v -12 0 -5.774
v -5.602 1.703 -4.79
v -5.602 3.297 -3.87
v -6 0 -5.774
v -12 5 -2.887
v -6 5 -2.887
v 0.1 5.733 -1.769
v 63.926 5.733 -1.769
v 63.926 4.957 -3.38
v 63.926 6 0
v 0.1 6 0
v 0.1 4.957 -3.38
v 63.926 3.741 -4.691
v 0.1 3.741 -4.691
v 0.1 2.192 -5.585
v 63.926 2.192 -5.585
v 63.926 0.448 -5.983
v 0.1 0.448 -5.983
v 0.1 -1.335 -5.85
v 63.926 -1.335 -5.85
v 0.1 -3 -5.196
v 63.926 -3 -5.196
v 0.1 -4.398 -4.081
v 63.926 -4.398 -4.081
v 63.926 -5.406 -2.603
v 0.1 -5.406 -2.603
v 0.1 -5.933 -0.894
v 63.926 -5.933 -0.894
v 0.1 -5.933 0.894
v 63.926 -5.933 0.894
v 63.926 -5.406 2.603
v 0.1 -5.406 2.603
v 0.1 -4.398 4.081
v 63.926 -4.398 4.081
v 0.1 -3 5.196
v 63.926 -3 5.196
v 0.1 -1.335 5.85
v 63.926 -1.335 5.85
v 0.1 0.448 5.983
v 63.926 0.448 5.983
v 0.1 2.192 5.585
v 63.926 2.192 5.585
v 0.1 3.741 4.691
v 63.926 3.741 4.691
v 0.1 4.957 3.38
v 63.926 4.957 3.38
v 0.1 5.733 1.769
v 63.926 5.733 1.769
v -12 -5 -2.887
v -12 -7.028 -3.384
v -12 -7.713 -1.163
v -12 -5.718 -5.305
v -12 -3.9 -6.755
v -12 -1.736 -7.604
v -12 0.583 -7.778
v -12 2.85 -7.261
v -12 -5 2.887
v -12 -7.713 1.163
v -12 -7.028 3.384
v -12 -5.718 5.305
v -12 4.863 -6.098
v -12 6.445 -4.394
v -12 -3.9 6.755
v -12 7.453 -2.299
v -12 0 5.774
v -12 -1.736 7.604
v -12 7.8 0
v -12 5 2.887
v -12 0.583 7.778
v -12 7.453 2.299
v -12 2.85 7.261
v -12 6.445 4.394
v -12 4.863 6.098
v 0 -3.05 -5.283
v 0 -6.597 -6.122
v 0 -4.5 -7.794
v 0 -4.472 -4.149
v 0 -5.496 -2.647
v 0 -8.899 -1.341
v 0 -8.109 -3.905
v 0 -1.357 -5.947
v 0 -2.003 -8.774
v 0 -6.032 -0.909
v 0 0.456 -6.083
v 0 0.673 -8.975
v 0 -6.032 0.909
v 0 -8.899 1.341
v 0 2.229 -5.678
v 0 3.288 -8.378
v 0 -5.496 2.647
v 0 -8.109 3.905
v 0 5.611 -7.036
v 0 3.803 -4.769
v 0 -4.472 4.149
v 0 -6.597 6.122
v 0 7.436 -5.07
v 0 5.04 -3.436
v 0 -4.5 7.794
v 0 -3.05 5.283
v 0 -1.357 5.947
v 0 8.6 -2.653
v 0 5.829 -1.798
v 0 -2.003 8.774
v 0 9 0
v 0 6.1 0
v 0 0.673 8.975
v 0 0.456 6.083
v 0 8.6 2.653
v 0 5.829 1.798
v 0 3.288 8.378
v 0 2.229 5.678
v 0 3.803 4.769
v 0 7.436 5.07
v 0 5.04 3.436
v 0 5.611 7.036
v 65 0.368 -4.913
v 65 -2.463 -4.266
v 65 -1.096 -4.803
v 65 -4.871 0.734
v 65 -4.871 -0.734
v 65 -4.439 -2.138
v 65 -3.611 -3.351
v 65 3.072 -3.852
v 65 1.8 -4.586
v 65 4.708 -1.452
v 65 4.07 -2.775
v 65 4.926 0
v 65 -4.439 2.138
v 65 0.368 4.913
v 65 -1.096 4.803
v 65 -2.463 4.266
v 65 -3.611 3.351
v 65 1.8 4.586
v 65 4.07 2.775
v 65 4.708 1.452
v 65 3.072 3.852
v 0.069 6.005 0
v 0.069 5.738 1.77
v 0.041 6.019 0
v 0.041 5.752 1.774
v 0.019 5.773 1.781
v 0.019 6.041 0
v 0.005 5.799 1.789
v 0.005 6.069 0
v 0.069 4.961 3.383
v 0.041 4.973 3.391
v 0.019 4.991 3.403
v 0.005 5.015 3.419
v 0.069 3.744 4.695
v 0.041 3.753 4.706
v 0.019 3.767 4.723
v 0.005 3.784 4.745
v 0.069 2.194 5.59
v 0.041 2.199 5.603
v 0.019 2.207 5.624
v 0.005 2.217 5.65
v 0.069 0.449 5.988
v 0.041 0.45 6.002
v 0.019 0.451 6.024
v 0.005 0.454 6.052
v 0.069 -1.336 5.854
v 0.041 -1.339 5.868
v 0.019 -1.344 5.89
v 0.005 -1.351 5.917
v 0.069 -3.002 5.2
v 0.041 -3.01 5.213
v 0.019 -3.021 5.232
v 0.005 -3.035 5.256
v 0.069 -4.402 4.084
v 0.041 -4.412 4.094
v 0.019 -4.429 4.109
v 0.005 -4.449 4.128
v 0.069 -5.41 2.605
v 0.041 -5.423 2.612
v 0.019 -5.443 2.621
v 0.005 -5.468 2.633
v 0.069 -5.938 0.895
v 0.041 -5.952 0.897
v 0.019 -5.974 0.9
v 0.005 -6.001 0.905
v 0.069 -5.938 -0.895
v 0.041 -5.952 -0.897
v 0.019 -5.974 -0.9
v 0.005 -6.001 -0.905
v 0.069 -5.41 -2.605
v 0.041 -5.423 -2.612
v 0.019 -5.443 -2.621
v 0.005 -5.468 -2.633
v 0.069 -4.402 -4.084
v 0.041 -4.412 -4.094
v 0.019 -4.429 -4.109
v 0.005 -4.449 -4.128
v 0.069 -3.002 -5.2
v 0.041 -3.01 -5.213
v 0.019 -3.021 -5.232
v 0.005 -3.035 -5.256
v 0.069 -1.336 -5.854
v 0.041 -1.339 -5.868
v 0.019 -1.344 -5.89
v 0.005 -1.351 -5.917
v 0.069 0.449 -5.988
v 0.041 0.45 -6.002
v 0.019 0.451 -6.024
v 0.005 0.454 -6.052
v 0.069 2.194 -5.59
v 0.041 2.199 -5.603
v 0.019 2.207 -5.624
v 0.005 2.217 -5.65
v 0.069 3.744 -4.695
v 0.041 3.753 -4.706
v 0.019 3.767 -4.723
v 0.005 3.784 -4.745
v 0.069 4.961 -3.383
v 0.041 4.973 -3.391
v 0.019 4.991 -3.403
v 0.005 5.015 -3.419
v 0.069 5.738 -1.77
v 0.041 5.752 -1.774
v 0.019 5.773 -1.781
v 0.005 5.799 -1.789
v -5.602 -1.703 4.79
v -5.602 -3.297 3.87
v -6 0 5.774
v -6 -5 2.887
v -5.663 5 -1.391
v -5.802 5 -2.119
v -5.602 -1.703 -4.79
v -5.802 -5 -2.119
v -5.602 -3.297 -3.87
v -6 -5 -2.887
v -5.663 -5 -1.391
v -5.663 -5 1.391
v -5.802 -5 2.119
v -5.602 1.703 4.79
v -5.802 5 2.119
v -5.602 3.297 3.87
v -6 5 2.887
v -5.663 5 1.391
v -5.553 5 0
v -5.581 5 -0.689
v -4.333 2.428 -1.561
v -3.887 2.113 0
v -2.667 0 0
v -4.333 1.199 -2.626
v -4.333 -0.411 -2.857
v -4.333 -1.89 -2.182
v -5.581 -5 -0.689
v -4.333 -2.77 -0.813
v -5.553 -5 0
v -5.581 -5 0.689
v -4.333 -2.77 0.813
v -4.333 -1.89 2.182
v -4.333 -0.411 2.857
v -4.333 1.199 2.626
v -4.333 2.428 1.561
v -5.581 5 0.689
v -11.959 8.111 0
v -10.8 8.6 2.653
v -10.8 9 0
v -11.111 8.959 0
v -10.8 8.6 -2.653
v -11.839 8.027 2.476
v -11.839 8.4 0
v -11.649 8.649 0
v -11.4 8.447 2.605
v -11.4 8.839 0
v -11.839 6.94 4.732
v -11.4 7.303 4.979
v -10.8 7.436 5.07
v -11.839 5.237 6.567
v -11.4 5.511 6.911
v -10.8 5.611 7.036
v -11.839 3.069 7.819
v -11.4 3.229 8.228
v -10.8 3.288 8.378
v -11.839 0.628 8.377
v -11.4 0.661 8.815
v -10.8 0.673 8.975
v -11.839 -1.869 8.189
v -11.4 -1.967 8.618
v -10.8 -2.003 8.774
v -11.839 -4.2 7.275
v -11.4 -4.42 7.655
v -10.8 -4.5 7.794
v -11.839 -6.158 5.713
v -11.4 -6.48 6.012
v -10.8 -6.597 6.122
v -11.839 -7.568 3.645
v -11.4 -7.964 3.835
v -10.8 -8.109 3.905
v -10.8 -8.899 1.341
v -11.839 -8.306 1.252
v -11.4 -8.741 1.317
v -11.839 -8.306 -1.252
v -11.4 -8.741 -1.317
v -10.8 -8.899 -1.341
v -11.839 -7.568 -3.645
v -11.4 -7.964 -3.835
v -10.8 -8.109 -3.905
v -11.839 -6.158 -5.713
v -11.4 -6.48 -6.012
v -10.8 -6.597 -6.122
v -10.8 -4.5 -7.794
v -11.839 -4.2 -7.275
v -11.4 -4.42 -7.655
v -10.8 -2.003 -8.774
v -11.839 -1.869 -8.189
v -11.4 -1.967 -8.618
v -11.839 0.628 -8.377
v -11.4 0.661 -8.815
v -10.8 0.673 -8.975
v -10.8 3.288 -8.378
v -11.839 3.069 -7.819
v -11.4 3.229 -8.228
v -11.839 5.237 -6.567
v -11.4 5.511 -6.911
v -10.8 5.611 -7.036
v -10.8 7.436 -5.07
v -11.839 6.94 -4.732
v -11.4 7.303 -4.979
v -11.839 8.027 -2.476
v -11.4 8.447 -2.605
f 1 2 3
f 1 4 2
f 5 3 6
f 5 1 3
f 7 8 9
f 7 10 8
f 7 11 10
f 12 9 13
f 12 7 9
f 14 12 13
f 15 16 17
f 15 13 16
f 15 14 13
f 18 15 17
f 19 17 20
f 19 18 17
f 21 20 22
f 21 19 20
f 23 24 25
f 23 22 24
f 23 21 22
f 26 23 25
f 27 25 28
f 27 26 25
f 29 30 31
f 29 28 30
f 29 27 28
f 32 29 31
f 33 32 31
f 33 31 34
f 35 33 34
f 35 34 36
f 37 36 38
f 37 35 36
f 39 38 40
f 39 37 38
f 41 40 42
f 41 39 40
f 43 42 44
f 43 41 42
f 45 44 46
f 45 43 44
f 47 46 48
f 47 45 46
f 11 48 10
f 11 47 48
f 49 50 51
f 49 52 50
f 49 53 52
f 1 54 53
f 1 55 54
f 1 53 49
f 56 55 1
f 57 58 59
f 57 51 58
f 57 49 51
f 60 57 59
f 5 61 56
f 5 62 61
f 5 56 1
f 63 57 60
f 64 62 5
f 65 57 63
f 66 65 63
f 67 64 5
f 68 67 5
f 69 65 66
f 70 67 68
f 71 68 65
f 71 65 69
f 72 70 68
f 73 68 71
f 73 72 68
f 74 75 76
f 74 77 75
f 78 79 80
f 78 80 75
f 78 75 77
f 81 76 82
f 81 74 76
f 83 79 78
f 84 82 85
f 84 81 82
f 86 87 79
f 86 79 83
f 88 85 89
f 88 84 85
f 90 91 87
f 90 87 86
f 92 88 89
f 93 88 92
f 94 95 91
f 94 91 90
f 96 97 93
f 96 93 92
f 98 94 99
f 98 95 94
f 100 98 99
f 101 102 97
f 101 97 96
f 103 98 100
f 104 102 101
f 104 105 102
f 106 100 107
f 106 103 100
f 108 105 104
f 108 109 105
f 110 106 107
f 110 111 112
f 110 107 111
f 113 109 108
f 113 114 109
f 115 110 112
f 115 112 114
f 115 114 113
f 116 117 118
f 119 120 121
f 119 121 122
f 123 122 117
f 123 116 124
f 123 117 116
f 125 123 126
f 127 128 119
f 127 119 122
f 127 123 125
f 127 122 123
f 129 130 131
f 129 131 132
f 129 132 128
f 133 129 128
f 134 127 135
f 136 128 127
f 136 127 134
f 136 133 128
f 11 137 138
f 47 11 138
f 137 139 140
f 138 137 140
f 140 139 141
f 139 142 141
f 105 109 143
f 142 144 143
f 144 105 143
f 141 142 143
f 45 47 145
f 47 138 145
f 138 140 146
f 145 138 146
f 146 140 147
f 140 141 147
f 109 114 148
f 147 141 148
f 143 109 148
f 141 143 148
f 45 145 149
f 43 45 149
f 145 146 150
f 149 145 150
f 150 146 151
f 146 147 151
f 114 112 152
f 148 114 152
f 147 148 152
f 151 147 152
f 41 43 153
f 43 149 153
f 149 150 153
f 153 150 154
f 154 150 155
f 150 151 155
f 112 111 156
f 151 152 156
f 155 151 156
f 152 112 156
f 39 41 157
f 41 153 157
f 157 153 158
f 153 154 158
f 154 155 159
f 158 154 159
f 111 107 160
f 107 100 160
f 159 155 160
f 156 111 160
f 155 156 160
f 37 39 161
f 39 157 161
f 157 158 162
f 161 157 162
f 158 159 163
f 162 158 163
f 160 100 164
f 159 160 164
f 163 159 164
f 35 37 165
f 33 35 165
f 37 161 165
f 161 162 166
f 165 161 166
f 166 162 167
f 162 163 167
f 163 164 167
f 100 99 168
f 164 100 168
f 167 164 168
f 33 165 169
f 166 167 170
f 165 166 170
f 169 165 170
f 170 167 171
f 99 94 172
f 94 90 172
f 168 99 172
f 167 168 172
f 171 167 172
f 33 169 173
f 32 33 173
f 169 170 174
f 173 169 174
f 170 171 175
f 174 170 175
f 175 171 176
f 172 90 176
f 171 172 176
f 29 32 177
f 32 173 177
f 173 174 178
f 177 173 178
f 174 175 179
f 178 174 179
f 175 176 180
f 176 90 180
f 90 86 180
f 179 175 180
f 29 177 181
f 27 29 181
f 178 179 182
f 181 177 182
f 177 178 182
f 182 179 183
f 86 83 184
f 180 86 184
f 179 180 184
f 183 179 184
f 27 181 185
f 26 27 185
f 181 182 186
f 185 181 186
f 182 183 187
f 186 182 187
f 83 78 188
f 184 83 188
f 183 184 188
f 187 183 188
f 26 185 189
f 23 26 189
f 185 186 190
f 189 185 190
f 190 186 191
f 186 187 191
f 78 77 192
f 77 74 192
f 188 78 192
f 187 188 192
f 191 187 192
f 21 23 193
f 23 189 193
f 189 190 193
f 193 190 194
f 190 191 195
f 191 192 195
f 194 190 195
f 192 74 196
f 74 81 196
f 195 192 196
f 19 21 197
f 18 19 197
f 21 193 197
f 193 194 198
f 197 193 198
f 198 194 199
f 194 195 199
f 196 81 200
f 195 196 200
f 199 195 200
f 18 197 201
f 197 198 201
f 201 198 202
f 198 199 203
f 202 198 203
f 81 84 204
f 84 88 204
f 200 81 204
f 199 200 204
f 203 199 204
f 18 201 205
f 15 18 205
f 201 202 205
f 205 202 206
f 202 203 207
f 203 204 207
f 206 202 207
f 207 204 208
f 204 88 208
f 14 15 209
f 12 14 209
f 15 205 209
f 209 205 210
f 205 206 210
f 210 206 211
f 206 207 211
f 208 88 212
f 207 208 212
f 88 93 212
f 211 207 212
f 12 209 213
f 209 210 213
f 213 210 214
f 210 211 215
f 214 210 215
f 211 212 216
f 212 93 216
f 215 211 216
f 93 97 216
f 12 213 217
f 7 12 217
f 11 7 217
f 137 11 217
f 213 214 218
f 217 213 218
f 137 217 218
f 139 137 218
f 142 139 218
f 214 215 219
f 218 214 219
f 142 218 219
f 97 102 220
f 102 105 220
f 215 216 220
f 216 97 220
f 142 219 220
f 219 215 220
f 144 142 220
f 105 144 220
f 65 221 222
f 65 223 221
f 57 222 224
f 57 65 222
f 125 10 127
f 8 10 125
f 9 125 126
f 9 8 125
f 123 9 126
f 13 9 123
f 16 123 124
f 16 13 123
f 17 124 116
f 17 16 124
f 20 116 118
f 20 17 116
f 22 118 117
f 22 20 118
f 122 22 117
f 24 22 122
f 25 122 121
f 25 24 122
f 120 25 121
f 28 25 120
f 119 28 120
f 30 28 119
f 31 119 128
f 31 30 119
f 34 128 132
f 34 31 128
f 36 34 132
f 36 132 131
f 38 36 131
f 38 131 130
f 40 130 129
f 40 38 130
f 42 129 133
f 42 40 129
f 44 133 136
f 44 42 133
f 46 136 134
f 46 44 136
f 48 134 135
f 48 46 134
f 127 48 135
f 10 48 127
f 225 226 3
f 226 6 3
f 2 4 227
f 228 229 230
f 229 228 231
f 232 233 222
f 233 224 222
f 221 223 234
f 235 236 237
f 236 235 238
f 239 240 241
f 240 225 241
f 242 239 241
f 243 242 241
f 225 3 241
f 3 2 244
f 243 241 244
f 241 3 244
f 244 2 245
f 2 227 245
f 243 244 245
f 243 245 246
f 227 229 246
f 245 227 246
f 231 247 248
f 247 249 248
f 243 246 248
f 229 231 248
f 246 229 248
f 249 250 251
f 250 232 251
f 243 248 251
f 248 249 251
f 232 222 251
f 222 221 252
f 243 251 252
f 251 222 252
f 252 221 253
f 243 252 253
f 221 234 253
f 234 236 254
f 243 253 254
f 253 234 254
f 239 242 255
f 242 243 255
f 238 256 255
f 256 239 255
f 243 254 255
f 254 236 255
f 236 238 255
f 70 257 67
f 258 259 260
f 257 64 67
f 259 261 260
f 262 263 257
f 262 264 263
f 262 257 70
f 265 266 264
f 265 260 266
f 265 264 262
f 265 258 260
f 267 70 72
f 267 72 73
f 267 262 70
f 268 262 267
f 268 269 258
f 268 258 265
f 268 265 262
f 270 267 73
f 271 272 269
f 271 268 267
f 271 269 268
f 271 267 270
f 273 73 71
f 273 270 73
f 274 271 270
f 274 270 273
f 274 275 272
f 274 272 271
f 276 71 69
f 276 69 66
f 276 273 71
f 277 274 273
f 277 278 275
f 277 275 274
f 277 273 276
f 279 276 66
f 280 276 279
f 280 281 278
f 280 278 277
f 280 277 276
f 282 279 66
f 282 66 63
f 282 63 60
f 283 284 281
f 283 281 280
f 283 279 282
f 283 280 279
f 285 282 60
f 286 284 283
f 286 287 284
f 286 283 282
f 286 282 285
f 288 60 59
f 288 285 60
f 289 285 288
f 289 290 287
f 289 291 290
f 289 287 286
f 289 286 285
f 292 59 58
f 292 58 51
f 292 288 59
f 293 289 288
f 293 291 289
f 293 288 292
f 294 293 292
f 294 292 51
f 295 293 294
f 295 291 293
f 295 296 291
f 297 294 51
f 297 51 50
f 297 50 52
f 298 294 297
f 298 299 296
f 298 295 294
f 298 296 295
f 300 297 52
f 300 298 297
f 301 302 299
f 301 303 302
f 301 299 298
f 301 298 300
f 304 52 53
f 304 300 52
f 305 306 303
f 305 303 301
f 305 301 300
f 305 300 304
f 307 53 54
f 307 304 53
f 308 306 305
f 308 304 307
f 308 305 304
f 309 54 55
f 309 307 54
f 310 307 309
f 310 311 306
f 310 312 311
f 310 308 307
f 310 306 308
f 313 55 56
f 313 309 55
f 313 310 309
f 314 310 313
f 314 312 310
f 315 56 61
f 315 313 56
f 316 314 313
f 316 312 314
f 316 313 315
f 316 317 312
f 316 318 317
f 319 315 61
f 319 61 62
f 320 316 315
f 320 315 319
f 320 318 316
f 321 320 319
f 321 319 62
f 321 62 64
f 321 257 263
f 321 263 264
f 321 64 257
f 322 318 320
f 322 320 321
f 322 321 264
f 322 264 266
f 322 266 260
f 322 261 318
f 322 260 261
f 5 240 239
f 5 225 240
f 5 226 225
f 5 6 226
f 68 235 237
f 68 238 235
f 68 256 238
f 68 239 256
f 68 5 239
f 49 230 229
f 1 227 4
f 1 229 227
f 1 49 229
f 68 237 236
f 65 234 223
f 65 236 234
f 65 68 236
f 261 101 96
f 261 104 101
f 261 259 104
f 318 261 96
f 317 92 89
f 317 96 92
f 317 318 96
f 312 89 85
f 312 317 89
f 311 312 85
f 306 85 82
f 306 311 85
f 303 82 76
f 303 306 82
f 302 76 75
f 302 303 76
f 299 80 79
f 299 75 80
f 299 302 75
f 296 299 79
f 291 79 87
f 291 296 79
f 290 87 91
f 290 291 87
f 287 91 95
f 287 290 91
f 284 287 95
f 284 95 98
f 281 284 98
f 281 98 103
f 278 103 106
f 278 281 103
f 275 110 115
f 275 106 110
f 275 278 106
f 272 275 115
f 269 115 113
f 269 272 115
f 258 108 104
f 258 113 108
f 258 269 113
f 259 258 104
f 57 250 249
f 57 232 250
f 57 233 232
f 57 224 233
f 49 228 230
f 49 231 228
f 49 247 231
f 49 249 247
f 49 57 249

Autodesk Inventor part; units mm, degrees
ref_plane "YZ Plane" through (0, 0, 0) normal (1, 0, 0) x (0, 1, 0)
ref_plane "XZ Plane" through (0, 0, 0) normal (0, 1, 0) x (-1, 0, 0)
sketch "Rascunho1" plane through (0, 0, 0) normal (0, 0, 1) x (1, 0, 0)
  line L0 (-2.6667, 0) -> (65, 0)
  line L1 (65, 0) -> (65, 6)
  line L2 (65, 6) -> (29, 6)
  line L3 (29, 6) -> (27.9264, 6)
  line L4 (27.9264, 6) -> (0, 6)
  line L5 (0, 6) -> (0, 9)
  line L6 (0, 9) -> (-12, 9)
  line L7 (-12, 9) -> (-12, 5.7735)
  line L8 (-12, 5.7735) -> (-6, 5.7735)
  line L9 (-6, 5.7735) -> (-2.6667, 0)
  line L10 (-34.4, 0) -> (122.4, 0) projected
  line L11 (0, -1.8) -> (0, 10.8) projected
  line L12 (29, 6) -> (0, 6) construction
  dimension "d1" = 36
  dimension "d2" = 1.0736
  dimension "d3" = 12
  dimension "d4" = 6
  dimension "d5" = 60
  dimension "d6" = 12
  dimension "d7" = 12
  dimension "d8" = 11.547
  dimension "d9" = 18
  dimension "d26" = 65
revolve "Corpo" add sketch "Rascunho1" angle 360 about axis through (-2.6667, 0, 0) along (1, 0, 0)
sketch "Rascunho2" plane through (-12, 0, 0) normal (-1, 0, 0) x (0, 0, 1)
  circle A0 centre (0, 0) radius 5.7735 projected
  line L0 (0, -12.6) -> (0, 12.6) projected
  line L1 (-12.6, 0) -> (12.6, 0) projected
  line L2 (5.7735, 0) -> (2.8868, -5)
  line L3 (2.8868, -5) -> (-2.8868, -5)
  line L4 (-2.8868, -5) -> (-5.7735, 0)
  line L5 (-5.7735, 0) -> (-2.8868, 5)
  line L6 (-2.8868, 5) -> (2.8868, 5)
  line L7 (2.8868, 5) -> (5.7735, 0)
extrude "Fenda" add sketch "Rascunho2" against normal up to next contours L7 A0 | A0 L2 | L6 L0 A0 | A0 L0 L3 | L0 L6 A0 | A0 L3 L0 | L4 A0 | A0 L5
fillet "Raio de arredondamento1" radius 1.2 1 edges at (-12, -9, 0)
thread "Rosca" size "M12x1.75" class "6g" standard "ANSI Metric M Profile" length 36
chamfer "Chanfrar1" distance 1.0735 distance2 1.0735 1 edges at (65, -6, 0) measured on face at (65, -1.5551, 1.8049)
ref_plane "Work Plane1" through (29, 0, 0) normal (0, -1, 0) x (1, 0, 0)
fillet "Fillet2" radius 0.1 1 edges at (0, -6, 0)
equation "\"d1\" = GEL"
equation "\"d3\" = KOH"
equation "\"d4\" = INTI"
equation "\"d6\" = GD"
equation "\"d7\" = BDM"
equation "\"d8\" = 1.1547 * SW"
equation "\"d9\" = KOD"
equation "\"d26\" = NLG"
equation "\"d17\" = RR"
equation "\"d13\" = GEL"
equation "\"d15\" = -0.5 * SPD + 0.5 * GD"
equation "\"d16\" = GUL"
equation "\"d30\" = R"
equation "\"GD\" = NND"
equation "\"NLG\" = 65"
equation "\"GEL\" = 36"
equation "\"KOD\" = 18"
equation "\"KOH\" = 12"
equation "\"INTI\" = 6"
equation "\"GAL\" = 0.61345 * PTC"
equation "\"GUL\" = 0.61345 * PTC"
equation "\"BDM\" = NND"
equation "\"RR\" = 1.2"
equation "\"SPD\" = NND - 1.2269 * PTC"
equation "\"R\" = 0.1"
equation "\"TOA\" = 30deg"
equation "\"GD1\" = THREADDIA - 1.2269 * PTC"
equation "\"THREADDIA\" = 12"
equation "\"FAWI\" = 45deg"
equation "\"ANG\" = 120deg"
equation "\"PTC\" = 1.75"
equation "\"NND\" = 12"
equation "\"E0\" = 1.155 * SW"
equation "\"SW\" = 10"
properties part number "DIN 912 - M12x65" material "Aço Inox AISI 304"
